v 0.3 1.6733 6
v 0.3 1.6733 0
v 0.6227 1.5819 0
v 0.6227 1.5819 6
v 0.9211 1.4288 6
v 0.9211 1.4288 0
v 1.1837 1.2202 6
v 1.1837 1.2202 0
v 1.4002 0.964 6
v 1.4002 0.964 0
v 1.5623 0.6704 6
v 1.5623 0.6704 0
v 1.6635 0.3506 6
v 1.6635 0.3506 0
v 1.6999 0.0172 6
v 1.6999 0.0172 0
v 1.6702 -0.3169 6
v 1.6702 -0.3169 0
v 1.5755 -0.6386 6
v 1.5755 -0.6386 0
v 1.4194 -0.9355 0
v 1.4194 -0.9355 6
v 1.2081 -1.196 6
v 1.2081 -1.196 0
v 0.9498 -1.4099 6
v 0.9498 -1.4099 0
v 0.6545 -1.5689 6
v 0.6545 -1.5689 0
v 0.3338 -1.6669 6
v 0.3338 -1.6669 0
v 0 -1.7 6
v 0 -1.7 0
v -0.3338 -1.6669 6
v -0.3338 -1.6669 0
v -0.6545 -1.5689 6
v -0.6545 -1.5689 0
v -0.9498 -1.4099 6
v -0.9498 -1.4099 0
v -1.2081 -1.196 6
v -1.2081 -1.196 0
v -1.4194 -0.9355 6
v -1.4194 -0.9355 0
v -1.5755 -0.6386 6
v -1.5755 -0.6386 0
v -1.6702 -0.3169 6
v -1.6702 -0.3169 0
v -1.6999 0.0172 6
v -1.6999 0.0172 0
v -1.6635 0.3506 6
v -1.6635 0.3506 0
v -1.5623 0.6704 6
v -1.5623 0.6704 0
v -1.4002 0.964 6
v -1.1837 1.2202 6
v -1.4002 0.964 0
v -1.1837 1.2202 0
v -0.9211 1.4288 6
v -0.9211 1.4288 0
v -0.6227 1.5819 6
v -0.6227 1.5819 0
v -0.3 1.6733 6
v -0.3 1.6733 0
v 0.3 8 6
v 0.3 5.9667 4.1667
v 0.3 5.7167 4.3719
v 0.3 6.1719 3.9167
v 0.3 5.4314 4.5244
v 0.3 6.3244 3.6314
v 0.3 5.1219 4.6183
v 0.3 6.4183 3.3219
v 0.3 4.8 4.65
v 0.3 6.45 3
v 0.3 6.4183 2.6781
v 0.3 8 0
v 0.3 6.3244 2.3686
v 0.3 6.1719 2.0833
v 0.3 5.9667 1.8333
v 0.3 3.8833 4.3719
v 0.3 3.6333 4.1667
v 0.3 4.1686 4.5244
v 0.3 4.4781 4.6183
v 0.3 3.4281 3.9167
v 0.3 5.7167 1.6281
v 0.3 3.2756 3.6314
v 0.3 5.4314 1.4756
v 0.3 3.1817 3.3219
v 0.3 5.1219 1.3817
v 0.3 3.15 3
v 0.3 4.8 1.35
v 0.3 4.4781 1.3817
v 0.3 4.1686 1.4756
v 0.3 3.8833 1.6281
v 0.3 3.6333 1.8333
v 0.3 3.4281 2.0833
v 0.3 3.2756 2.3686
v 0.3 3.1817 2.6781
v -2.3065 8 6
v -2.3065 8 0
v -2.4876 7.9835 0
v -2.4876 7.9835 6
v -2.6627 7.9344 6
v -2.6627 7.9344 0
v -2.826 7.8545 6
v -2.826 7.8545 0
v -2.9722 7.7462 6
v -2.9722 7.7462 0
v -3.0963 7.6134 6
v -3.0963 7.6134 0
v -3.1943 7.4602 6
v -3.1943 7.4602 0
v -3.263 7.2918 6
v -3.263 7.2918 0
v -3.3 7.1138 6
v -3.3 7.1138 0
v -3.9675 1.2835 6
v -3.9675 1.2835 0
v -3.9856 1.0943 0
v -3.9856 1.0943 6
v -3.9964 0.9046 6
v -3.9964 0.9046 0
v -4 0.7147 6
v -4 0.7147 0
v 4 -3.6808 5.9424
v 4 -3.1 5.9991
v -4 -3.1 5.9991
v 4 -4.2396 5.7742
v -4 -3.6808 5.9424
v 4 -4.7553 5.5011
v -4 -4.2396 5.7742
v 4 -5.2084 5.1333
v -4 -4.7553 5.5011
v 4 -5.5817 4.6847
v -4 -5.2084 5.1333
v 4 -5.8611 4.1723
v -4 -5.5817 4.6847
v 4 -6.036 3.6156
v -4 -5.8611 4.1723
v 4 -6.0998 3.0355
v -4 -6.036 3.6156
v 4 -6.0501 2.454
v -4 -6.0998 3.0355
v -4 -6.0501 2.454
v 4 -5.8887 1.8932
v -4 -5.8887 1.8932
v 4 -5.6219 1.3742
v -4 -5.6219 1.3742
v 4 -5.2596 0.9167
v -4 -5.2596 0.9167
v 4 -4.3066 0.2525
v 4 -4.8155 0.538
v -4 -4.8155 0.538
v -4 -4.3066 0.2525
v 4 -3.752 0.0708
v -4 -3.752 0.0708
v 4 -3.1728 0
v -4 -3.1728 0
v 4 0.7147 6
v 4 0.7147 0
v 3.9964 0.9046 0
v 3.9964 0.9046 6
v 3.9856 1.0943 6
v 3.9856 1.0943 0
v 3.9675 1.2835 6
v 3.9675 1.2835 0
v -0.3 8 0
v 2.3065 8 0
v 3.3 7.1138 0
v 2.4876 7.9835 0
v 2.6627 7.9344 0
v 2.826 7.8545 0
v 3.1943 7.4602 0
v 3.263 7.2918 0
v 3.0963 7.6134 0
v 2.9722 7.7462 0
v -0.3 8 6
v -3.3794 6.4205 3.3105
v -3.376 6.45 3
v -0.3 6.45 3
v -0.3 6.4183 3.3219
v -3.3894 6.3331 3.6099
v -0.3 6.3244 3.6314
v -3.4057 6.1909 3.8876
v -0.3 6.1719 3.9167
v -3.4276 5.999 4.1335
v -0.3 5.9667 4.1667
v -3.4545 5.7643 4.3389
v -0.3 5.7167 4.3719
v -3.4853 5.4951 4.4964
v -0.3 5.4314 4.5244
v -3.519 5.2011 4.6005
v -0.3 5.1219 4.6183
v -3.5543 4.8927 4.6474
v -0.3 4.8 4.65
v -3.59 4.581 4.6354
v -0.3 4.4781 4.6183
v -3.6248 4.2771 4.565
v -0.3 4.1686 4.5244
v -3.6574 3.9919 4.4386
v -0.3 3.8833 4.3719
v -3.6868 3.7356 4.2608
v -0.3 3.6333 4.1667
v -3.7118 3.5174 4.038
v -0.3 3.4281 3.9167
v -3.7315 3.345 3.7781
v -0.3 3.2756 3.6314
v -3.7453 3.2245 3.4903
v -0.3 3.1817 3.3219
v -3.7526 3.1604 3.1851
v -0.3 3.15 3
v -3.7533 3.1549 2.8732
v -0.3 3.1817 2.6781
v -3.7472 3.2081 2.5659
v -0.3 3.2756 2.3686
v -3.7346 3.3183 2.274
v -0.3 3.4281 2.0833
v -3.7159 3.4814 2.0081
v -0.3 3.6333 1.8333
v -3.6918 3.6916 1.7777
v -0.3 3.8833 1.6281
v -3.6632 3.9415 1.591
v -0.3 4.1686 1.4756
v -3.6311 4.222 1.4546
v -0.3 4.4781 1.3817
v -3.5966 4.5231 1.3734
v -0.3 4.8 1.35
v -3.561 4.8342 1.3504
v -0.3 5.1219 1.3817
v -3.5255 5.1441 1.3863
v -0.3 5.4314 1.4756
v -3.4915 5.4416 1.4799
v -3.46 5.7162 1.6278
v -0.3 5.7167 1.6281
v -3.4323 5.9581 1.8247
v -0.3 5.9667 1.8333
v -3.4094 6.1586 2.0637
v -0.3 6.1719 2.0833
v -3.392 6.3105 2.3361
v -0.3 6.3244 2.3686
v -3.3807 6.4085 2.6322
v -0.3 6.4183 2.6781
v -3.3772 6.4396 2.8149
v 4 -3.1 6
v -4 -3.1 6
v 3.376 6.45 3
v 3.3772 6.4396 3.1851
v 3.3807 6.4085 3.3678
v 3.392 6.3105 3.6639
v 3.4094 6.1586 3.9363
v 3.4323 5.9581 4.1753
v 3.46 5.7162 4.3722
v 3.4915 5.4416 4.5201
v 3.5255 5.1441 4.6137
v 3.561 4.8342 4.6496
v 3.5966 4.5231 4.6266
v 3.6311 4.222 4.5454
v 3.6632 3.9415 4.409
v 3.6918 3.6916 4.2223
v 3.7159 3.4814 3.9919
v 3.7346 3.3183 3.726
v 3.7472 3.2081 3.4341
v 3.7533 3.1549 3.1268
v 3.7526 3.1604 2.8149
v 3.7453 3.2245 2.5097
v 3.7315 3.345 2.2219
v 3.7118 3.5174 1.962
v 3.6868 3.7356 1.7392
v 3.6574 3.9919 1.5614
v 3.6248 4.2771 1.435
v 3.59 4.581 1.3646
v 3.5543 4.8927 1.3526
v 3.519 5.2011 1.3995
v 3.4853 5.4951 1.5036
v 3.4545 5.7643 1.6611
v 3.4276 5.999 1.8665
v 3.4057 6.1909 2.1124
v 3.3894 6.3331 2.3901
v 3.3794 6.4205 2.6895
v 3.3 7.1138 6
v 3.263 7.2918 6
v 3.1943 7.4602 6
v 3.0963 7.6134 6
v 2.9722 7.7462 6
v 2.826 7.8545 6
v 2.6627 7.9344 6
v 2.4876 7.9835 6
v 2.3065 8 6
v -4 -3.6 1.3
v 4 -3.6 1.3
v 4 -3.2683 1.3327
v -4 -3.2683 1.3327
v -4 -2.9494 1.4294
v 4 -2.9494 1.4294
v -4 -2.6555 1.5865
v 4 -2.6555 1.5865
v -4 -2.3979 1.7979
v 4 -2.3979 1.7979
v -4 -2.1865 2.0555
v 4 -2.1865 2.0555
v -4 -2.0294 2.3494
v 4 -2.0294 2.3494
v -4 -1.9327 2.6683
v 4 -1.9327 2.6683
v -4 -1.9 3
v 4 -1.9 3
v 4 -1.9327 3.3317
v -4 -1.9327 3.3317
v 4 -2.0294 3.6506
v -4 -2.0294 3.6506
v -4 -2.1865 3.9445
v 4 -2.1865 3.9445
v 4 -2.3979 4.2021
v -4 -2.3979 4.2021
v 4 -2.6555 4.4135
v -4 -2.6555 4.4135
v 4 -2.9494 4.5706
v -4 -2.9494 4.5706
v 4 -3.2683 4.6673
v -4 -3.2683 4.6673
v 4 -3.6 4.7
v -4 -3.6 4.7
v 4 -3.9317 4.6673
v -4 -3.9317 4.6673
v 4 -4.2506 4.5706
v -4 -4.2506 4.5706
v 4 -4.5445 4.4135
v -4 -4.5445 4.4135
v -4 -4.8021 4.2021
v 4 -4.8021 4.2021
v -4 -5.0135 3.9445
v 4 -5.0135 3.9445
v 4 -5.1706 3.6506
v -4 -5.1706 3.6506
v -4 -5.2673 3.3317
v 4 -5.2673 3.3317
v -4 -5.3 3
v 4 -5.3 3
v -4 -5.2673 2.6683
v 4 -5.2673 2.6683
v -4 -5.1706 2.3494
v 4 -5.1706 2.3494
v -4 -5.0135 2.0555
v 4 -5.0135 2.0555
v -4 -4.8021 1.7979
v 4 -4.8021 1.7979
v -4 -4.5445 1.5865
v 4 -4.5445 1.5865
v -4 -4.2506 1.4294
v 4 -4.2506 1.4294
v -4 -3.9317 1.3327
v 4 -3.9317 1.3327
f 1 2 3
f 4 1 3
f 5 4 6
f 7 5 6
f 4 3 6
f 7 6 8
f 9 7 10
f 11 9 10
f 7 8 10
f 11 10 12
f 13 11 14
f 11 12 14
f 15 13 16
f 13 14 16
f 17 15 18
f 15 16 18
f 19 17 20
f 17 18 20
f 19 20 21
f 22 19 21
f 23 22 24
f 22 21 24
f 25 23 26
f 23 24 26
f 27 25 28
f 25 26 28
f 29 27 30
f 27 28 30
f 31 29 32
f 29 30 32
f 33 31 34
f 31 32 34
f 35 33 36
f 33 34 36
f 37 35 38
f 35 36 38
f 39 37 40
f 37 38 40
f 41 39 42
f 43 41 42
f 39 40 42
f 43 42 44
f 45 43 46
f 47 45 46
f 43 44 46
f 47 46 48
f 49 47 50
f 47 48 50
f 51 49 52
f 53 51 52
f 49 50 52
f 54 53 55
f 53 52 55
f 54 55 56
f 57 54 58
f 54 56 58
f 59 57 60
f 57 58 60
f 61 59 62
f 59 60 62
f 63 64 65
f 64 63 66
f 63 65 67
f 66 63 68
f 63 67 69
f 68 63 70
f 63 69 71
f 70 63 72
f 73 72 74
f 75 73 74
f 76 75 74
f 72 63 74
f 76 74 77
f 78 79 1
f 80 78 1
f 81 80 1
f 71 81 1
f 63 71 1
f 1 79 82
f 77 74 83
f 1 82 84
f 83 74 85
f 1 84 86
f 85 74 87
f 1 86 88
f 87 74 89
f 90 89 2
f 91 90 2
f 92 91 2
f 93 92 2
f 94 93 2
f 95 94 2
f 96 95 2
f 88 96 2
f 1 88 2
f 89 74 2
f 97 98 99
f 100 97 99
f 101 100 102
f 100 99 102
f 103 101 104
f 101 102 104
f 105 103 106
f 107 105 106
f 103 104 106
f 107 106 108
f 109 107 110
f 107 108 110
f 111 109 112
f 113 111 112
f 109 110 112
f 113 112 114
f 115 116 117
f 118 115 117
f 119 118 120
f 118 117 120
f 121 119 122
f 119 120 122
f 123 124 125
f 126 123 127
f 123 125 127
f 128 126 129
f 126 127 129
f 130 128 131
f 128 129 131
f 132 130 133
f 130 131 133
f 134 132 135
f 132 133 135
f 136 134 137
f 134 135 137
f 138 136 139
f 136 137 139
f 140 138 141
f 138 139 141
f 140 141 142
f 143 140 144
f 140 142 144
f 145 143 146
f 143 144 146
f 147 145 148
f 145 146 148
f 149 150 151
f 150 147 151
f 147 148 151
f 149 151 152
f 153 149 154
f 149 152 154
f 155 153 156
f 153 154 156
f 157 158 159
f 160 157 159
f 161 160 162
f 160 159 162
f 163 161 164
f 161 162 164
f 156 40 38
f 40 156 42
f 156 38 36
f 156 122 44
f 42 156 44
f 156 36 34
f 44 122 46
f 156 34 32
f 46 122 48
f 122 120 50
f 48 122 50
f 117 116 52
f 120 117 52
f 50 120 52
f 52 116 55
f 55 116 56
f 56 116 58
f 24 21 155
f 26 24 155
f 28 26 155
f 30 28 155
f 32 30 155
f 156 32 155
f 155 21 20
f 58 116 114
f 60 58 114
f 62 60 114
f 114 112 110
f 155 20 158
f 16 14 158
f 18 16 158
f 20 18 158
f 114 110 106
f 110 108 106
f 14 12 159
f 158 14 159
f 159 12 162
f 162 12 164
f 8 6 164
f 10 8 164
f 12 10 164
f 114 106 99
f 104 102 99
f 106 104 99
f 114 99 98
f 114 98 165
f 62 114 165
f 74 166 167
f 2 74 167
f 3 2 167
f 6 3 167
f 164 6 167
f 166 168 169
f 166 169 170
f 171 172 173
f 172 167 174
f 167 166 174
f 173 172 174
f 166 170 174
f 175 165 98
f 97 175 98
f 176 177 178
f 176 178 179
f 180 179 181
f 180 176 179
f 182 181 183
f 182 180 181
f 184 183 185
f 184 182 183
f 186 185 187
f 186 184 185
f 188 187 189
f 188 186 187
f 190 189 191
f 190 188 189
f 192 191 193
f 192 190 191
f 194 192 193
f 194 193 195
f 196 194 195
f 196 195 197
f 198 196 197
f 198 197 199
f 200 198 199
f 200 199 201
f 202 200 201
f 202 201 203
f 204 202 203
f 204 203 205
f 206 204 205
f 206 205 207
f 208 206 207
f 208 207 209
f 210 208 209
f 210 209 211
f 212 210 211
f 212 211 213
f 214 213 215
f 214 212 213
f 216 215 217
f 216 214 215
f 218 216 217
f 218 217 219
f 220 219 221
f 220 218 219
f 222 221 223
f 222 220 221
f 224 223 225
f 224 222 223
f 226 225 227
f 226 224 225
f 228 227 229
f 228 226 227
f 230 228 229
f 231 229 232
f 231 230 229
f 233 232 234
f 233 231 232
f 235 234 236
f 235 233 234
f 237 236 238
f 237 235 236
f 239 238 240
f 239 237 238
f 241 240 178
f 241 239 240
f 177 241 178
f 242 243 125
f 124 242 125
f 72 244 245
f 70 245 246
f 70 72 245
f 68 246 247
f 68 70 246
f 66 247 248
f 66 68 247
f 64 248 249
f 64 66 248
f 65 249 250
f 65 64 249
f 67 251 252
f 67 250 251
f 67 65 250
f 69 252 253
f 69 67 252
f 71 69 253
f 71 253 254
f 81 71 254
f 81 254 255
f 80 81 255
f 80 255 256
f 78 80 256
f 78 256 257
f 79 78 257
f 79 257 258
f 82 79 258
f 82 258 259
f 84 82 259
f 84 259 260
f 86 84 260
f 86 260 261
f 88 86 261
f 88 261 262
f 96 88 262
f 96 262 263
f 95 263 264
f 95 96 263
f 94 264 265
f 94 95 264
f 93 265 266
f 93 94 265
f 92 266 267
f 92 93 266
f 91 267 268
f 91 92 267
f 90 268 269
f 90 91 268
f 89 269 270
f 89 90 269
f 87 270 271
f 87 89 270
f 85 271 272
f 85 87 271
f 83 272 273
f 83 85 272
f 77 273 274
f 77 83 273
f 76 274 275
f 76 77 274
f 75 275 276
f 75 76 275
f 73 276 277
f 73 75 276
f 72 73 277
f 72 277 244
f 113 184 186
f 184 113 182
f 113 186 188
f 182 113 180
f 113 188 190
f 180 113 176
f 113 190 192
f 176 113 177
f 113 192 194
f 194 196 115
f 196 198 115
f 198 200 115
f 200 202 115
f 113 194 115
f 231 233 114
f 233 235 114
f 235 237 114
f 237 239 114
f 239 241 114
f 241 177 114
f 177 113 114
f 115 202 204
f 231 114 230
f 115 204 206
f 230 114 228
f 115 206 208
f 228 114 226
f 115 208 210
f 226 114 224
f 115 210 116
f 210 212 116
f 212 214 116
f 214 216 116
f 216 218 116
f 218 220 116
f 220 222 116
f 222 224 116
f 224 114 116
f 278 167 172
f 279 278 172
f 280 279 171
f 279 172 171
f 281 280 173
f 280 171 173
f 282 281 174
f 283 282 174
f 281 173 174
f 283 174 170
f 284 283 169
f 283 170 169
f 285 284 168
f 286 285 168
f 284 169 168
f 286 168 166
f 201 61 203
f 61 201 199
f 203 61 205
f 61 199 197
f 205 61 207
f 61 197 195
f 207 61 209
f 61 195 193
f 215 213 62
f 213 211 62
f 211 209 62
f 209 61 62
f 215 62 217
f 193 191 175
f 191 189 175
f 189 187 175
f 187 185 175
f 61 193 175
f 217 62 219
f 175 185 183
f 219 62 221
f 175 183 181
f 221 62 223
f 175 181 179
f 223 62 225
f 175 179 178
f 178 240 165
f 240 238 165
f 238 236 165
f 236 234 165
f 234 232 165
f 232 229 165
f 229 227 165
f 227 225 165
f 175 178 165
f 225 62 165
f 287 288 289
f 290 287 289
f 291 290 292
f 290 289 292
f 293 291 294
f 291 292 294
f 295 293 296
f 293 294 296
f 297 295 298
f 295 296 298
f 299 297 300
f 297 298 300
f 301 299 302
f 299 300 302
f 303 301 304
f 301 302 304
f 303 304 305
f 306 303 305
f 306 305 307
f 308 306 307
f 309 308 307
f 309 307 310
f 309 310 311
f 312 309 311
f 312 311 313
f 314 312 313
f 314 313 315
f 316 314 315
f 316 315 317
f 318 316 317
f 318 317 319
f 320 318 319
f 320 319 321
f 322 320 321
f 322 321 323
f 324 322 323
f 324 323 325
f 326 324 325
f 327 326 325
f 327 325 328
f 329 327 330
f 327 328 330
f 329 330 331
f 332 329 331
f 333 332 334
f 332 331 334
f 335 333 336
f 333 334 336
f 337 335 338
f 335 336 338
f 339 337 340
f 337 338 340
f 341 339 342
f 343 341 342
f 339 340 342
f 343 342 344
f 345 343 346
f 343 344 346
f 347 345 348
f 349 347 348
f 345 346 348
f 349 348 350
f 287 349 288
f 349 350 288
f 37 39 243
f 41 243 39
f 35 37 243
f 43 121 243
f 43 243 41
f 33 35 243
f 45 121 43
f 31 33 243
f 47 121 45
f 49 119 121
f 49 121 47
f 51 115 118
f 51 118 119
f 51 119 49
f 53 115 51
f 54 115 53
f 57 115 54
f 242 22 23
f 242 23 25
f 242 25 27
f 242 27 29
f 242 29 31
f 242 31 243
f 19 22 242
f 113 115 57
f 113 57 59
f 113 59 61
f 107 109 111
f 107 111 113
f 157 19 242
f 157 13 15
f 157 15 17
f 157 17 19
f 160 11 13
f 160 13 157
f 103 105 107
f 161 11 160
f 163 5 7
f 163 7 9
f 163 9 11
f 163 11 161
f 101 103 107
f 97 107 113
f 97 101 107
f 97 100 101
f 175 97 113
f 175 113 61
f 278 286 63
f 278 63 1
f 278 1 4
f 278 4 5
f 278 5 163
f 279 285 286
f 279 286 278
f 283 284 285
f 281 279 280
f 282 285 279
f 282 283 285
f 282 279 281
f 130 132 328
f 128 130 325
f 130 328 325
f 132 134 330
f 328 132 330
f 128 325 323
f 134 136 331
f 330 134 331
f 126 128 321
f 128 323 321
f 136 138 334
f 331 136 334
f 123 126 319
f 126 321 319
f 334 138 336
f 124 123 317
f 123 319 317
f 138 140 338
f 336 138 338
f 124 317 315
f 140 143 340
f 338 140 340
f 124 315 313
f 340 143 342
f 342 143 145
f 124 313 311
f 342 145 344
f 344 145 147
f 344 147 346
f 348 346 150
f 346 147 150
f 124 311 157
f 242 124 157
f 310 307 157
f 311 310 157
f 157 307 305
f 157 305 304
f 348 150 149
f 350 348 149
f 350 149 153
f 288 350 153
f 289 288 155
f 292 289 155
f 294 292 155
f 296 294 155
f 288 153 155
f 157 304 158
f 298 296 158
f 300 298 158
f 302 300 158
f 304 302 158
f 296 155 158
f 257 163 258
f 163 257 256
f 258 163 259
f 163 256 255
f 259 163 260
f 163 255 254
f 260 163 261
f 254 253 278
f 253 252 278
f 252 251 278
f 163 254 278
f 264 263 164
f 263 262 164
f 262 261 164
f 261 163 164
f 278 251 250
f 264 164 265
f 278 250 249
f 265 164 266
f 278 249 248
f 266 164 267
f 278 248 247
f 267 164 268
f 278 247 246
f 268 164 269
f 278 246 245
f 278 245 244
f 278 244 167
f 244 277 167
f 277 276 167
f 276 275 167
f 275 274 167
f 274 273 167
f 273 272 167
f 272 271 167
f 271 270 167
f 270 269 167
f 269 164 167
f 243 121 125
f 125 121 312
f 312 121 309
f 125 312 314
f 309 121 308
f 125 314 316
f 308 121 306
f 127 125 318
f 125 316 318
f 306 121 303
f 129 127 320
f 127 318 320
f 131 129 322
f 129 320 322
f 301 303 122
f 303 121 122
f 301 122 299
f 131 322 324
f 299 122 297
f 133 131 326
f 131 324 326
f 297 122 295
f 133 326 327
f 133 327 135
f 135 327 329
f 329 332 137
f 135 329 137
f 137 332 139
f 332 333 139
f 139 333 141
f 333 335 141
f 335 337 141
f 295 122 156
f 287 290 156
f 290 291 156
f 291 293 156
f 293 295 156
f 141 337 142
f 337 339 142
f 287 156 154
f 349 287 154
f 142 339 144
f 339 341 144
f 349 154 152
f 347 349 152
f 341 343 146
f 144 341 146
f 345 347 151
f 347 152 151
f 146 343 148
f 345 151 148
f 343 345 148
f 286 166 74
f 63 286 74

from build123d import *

# Parameters (mm, degrees)
EXTRUDE_1_DEPTH          = 6
SKETCH_2_R               = 1.7
CUT_EXTRUDE_1_DEPTH      = 13.806248475
CUT_EXTRUDE_2_DEPTH      = 11.770329614
CUT_EXTRUDE_2_DEPTH_BACK = 11.770329614
SKETCH_3_R               = 1.65
CUT_EXTRUDE_3_REACH      = 14.806


with BuildPart() as part:
    # 草图1 → 凸台-拉伸1 (new body)
    with BuildSketch(Plane.XY):
        with BuildLine():
            Line((-3.5, -7), (3.5, -7))
            ThreePointArc((3.5, -7), (3.853553391, -6.853553391), (4, -6.5))
            Line((4, -6.5), (4, 0.714692101))
            ThreePointArc((4, 0.714692101), (3.991879765, 0.999536647), (3.967545434, 1.28345599))
            Line((3.967545434, 1.28345599), (3.3, 7.113752778))
            ThreePointArc((3.3, 7.113752778), (2.972166218, 7.746241508), (2.306490913, 8))
            Line((2.306490913, 8), (0.3, 8))
            Line((0.3, 8), (0.3, 1.673320053))
            ThreePointArc((0.3, 1.673320053), (0, -1.7), (-0.3, 1.673320053))
            Line((-0.3, 1.673320053), (-0.3, 8))
            Line((-0.3, 8), (-2.306490913, 8))
            ThreePointArc((-2.306490913, 8), (-2.972166218, 7.746241508), (-3.3, 7.113752778))
            Line((-3.3, 7.113752778), (-3.967545434, 1.28345599))
            ThreePointArc((-3.967545434, 1.28345599), (-3.991879765, 0.999536647), (-4, 0.714692101))
            Line((-4, 0.714692101), (-4, -6.5))
            ThreePointArc((-4, -6.5), (-3.853553391, -6.853553391), (-3.5, -7))
        make_face()
    extrude(amount=EXTRUDE_1_DEPTH)

    # 草图2 → 切除-拉伸1 (cut, through all)
    with BuildSketch(Plane(origin=(4, 0, 0), x_dir=(0, 0, -1), z_dir=(1, 0, 0))):
        with Locations((-3, -3.6)):
            Circle(SKETCH_2_R)
    extrude(amount=-CUT_EXTRUDE_1_DEPTH, mode=Mode.SUBTRACT)

    # 草图3 → 切除-拉伸2 (cut, two sides: drawn at the far end of the back side and taken through both)
    with BuildSketch(Plane(origin=(0, 0, 0), x_dir=(0, 0, -1), z_dir=(1, 0, 0)).offset(-CUT_EXTRUDE_2_DEPTH_BACK)):
        with Locations(Location((-3, 4.8, 0), (0, 0, 90))):
            Circle(SKETCH_3_R)
    extrude(amount=CUT_EXTRUDE_2_DEPTH + CUT_EXTRUDE_2_DEPTH_BACK, mode=Mode.SUBTRACT)

    # 草图4 → 切除-拉伸3 (cut, up to next)
    with BuildSketch(Plane.ZY.offset(4), mode=Mode.PRIVATE) as cut_extrude_3_sk1:
        with BuildLine():
            Line((0, -3.172768856), (0, -9.012994764))
            Line((0, -9.012994764), (5.999117319, -9.012994764))
            Line((5.999117319, -9.012994764), (6.094166497, -9.012994764))
            Line((6.094166497, -9.012994764), (6.094166497, -3.1))
            Line((6.094166497, -3.1), (5.999117319, -3.1))
            ThreePointArc((5.999117319, -3.1), (3.035504424, -6.099779322), (0, -3.172768856))
        make_face()
    cut_extrude_3_tool1 = extrude(cut_extrude_3_sk1.sketch, amount=-CUT_EXTRUDE_3_REACH, mode=Mode.PRIVATE) & part.part
    add(cut_extrude_3_tool1.solids().sort_by_distance((-4, -7.143206, 3.078044))[0], mode=Mode.SUBTRACT)


solid = part.part
